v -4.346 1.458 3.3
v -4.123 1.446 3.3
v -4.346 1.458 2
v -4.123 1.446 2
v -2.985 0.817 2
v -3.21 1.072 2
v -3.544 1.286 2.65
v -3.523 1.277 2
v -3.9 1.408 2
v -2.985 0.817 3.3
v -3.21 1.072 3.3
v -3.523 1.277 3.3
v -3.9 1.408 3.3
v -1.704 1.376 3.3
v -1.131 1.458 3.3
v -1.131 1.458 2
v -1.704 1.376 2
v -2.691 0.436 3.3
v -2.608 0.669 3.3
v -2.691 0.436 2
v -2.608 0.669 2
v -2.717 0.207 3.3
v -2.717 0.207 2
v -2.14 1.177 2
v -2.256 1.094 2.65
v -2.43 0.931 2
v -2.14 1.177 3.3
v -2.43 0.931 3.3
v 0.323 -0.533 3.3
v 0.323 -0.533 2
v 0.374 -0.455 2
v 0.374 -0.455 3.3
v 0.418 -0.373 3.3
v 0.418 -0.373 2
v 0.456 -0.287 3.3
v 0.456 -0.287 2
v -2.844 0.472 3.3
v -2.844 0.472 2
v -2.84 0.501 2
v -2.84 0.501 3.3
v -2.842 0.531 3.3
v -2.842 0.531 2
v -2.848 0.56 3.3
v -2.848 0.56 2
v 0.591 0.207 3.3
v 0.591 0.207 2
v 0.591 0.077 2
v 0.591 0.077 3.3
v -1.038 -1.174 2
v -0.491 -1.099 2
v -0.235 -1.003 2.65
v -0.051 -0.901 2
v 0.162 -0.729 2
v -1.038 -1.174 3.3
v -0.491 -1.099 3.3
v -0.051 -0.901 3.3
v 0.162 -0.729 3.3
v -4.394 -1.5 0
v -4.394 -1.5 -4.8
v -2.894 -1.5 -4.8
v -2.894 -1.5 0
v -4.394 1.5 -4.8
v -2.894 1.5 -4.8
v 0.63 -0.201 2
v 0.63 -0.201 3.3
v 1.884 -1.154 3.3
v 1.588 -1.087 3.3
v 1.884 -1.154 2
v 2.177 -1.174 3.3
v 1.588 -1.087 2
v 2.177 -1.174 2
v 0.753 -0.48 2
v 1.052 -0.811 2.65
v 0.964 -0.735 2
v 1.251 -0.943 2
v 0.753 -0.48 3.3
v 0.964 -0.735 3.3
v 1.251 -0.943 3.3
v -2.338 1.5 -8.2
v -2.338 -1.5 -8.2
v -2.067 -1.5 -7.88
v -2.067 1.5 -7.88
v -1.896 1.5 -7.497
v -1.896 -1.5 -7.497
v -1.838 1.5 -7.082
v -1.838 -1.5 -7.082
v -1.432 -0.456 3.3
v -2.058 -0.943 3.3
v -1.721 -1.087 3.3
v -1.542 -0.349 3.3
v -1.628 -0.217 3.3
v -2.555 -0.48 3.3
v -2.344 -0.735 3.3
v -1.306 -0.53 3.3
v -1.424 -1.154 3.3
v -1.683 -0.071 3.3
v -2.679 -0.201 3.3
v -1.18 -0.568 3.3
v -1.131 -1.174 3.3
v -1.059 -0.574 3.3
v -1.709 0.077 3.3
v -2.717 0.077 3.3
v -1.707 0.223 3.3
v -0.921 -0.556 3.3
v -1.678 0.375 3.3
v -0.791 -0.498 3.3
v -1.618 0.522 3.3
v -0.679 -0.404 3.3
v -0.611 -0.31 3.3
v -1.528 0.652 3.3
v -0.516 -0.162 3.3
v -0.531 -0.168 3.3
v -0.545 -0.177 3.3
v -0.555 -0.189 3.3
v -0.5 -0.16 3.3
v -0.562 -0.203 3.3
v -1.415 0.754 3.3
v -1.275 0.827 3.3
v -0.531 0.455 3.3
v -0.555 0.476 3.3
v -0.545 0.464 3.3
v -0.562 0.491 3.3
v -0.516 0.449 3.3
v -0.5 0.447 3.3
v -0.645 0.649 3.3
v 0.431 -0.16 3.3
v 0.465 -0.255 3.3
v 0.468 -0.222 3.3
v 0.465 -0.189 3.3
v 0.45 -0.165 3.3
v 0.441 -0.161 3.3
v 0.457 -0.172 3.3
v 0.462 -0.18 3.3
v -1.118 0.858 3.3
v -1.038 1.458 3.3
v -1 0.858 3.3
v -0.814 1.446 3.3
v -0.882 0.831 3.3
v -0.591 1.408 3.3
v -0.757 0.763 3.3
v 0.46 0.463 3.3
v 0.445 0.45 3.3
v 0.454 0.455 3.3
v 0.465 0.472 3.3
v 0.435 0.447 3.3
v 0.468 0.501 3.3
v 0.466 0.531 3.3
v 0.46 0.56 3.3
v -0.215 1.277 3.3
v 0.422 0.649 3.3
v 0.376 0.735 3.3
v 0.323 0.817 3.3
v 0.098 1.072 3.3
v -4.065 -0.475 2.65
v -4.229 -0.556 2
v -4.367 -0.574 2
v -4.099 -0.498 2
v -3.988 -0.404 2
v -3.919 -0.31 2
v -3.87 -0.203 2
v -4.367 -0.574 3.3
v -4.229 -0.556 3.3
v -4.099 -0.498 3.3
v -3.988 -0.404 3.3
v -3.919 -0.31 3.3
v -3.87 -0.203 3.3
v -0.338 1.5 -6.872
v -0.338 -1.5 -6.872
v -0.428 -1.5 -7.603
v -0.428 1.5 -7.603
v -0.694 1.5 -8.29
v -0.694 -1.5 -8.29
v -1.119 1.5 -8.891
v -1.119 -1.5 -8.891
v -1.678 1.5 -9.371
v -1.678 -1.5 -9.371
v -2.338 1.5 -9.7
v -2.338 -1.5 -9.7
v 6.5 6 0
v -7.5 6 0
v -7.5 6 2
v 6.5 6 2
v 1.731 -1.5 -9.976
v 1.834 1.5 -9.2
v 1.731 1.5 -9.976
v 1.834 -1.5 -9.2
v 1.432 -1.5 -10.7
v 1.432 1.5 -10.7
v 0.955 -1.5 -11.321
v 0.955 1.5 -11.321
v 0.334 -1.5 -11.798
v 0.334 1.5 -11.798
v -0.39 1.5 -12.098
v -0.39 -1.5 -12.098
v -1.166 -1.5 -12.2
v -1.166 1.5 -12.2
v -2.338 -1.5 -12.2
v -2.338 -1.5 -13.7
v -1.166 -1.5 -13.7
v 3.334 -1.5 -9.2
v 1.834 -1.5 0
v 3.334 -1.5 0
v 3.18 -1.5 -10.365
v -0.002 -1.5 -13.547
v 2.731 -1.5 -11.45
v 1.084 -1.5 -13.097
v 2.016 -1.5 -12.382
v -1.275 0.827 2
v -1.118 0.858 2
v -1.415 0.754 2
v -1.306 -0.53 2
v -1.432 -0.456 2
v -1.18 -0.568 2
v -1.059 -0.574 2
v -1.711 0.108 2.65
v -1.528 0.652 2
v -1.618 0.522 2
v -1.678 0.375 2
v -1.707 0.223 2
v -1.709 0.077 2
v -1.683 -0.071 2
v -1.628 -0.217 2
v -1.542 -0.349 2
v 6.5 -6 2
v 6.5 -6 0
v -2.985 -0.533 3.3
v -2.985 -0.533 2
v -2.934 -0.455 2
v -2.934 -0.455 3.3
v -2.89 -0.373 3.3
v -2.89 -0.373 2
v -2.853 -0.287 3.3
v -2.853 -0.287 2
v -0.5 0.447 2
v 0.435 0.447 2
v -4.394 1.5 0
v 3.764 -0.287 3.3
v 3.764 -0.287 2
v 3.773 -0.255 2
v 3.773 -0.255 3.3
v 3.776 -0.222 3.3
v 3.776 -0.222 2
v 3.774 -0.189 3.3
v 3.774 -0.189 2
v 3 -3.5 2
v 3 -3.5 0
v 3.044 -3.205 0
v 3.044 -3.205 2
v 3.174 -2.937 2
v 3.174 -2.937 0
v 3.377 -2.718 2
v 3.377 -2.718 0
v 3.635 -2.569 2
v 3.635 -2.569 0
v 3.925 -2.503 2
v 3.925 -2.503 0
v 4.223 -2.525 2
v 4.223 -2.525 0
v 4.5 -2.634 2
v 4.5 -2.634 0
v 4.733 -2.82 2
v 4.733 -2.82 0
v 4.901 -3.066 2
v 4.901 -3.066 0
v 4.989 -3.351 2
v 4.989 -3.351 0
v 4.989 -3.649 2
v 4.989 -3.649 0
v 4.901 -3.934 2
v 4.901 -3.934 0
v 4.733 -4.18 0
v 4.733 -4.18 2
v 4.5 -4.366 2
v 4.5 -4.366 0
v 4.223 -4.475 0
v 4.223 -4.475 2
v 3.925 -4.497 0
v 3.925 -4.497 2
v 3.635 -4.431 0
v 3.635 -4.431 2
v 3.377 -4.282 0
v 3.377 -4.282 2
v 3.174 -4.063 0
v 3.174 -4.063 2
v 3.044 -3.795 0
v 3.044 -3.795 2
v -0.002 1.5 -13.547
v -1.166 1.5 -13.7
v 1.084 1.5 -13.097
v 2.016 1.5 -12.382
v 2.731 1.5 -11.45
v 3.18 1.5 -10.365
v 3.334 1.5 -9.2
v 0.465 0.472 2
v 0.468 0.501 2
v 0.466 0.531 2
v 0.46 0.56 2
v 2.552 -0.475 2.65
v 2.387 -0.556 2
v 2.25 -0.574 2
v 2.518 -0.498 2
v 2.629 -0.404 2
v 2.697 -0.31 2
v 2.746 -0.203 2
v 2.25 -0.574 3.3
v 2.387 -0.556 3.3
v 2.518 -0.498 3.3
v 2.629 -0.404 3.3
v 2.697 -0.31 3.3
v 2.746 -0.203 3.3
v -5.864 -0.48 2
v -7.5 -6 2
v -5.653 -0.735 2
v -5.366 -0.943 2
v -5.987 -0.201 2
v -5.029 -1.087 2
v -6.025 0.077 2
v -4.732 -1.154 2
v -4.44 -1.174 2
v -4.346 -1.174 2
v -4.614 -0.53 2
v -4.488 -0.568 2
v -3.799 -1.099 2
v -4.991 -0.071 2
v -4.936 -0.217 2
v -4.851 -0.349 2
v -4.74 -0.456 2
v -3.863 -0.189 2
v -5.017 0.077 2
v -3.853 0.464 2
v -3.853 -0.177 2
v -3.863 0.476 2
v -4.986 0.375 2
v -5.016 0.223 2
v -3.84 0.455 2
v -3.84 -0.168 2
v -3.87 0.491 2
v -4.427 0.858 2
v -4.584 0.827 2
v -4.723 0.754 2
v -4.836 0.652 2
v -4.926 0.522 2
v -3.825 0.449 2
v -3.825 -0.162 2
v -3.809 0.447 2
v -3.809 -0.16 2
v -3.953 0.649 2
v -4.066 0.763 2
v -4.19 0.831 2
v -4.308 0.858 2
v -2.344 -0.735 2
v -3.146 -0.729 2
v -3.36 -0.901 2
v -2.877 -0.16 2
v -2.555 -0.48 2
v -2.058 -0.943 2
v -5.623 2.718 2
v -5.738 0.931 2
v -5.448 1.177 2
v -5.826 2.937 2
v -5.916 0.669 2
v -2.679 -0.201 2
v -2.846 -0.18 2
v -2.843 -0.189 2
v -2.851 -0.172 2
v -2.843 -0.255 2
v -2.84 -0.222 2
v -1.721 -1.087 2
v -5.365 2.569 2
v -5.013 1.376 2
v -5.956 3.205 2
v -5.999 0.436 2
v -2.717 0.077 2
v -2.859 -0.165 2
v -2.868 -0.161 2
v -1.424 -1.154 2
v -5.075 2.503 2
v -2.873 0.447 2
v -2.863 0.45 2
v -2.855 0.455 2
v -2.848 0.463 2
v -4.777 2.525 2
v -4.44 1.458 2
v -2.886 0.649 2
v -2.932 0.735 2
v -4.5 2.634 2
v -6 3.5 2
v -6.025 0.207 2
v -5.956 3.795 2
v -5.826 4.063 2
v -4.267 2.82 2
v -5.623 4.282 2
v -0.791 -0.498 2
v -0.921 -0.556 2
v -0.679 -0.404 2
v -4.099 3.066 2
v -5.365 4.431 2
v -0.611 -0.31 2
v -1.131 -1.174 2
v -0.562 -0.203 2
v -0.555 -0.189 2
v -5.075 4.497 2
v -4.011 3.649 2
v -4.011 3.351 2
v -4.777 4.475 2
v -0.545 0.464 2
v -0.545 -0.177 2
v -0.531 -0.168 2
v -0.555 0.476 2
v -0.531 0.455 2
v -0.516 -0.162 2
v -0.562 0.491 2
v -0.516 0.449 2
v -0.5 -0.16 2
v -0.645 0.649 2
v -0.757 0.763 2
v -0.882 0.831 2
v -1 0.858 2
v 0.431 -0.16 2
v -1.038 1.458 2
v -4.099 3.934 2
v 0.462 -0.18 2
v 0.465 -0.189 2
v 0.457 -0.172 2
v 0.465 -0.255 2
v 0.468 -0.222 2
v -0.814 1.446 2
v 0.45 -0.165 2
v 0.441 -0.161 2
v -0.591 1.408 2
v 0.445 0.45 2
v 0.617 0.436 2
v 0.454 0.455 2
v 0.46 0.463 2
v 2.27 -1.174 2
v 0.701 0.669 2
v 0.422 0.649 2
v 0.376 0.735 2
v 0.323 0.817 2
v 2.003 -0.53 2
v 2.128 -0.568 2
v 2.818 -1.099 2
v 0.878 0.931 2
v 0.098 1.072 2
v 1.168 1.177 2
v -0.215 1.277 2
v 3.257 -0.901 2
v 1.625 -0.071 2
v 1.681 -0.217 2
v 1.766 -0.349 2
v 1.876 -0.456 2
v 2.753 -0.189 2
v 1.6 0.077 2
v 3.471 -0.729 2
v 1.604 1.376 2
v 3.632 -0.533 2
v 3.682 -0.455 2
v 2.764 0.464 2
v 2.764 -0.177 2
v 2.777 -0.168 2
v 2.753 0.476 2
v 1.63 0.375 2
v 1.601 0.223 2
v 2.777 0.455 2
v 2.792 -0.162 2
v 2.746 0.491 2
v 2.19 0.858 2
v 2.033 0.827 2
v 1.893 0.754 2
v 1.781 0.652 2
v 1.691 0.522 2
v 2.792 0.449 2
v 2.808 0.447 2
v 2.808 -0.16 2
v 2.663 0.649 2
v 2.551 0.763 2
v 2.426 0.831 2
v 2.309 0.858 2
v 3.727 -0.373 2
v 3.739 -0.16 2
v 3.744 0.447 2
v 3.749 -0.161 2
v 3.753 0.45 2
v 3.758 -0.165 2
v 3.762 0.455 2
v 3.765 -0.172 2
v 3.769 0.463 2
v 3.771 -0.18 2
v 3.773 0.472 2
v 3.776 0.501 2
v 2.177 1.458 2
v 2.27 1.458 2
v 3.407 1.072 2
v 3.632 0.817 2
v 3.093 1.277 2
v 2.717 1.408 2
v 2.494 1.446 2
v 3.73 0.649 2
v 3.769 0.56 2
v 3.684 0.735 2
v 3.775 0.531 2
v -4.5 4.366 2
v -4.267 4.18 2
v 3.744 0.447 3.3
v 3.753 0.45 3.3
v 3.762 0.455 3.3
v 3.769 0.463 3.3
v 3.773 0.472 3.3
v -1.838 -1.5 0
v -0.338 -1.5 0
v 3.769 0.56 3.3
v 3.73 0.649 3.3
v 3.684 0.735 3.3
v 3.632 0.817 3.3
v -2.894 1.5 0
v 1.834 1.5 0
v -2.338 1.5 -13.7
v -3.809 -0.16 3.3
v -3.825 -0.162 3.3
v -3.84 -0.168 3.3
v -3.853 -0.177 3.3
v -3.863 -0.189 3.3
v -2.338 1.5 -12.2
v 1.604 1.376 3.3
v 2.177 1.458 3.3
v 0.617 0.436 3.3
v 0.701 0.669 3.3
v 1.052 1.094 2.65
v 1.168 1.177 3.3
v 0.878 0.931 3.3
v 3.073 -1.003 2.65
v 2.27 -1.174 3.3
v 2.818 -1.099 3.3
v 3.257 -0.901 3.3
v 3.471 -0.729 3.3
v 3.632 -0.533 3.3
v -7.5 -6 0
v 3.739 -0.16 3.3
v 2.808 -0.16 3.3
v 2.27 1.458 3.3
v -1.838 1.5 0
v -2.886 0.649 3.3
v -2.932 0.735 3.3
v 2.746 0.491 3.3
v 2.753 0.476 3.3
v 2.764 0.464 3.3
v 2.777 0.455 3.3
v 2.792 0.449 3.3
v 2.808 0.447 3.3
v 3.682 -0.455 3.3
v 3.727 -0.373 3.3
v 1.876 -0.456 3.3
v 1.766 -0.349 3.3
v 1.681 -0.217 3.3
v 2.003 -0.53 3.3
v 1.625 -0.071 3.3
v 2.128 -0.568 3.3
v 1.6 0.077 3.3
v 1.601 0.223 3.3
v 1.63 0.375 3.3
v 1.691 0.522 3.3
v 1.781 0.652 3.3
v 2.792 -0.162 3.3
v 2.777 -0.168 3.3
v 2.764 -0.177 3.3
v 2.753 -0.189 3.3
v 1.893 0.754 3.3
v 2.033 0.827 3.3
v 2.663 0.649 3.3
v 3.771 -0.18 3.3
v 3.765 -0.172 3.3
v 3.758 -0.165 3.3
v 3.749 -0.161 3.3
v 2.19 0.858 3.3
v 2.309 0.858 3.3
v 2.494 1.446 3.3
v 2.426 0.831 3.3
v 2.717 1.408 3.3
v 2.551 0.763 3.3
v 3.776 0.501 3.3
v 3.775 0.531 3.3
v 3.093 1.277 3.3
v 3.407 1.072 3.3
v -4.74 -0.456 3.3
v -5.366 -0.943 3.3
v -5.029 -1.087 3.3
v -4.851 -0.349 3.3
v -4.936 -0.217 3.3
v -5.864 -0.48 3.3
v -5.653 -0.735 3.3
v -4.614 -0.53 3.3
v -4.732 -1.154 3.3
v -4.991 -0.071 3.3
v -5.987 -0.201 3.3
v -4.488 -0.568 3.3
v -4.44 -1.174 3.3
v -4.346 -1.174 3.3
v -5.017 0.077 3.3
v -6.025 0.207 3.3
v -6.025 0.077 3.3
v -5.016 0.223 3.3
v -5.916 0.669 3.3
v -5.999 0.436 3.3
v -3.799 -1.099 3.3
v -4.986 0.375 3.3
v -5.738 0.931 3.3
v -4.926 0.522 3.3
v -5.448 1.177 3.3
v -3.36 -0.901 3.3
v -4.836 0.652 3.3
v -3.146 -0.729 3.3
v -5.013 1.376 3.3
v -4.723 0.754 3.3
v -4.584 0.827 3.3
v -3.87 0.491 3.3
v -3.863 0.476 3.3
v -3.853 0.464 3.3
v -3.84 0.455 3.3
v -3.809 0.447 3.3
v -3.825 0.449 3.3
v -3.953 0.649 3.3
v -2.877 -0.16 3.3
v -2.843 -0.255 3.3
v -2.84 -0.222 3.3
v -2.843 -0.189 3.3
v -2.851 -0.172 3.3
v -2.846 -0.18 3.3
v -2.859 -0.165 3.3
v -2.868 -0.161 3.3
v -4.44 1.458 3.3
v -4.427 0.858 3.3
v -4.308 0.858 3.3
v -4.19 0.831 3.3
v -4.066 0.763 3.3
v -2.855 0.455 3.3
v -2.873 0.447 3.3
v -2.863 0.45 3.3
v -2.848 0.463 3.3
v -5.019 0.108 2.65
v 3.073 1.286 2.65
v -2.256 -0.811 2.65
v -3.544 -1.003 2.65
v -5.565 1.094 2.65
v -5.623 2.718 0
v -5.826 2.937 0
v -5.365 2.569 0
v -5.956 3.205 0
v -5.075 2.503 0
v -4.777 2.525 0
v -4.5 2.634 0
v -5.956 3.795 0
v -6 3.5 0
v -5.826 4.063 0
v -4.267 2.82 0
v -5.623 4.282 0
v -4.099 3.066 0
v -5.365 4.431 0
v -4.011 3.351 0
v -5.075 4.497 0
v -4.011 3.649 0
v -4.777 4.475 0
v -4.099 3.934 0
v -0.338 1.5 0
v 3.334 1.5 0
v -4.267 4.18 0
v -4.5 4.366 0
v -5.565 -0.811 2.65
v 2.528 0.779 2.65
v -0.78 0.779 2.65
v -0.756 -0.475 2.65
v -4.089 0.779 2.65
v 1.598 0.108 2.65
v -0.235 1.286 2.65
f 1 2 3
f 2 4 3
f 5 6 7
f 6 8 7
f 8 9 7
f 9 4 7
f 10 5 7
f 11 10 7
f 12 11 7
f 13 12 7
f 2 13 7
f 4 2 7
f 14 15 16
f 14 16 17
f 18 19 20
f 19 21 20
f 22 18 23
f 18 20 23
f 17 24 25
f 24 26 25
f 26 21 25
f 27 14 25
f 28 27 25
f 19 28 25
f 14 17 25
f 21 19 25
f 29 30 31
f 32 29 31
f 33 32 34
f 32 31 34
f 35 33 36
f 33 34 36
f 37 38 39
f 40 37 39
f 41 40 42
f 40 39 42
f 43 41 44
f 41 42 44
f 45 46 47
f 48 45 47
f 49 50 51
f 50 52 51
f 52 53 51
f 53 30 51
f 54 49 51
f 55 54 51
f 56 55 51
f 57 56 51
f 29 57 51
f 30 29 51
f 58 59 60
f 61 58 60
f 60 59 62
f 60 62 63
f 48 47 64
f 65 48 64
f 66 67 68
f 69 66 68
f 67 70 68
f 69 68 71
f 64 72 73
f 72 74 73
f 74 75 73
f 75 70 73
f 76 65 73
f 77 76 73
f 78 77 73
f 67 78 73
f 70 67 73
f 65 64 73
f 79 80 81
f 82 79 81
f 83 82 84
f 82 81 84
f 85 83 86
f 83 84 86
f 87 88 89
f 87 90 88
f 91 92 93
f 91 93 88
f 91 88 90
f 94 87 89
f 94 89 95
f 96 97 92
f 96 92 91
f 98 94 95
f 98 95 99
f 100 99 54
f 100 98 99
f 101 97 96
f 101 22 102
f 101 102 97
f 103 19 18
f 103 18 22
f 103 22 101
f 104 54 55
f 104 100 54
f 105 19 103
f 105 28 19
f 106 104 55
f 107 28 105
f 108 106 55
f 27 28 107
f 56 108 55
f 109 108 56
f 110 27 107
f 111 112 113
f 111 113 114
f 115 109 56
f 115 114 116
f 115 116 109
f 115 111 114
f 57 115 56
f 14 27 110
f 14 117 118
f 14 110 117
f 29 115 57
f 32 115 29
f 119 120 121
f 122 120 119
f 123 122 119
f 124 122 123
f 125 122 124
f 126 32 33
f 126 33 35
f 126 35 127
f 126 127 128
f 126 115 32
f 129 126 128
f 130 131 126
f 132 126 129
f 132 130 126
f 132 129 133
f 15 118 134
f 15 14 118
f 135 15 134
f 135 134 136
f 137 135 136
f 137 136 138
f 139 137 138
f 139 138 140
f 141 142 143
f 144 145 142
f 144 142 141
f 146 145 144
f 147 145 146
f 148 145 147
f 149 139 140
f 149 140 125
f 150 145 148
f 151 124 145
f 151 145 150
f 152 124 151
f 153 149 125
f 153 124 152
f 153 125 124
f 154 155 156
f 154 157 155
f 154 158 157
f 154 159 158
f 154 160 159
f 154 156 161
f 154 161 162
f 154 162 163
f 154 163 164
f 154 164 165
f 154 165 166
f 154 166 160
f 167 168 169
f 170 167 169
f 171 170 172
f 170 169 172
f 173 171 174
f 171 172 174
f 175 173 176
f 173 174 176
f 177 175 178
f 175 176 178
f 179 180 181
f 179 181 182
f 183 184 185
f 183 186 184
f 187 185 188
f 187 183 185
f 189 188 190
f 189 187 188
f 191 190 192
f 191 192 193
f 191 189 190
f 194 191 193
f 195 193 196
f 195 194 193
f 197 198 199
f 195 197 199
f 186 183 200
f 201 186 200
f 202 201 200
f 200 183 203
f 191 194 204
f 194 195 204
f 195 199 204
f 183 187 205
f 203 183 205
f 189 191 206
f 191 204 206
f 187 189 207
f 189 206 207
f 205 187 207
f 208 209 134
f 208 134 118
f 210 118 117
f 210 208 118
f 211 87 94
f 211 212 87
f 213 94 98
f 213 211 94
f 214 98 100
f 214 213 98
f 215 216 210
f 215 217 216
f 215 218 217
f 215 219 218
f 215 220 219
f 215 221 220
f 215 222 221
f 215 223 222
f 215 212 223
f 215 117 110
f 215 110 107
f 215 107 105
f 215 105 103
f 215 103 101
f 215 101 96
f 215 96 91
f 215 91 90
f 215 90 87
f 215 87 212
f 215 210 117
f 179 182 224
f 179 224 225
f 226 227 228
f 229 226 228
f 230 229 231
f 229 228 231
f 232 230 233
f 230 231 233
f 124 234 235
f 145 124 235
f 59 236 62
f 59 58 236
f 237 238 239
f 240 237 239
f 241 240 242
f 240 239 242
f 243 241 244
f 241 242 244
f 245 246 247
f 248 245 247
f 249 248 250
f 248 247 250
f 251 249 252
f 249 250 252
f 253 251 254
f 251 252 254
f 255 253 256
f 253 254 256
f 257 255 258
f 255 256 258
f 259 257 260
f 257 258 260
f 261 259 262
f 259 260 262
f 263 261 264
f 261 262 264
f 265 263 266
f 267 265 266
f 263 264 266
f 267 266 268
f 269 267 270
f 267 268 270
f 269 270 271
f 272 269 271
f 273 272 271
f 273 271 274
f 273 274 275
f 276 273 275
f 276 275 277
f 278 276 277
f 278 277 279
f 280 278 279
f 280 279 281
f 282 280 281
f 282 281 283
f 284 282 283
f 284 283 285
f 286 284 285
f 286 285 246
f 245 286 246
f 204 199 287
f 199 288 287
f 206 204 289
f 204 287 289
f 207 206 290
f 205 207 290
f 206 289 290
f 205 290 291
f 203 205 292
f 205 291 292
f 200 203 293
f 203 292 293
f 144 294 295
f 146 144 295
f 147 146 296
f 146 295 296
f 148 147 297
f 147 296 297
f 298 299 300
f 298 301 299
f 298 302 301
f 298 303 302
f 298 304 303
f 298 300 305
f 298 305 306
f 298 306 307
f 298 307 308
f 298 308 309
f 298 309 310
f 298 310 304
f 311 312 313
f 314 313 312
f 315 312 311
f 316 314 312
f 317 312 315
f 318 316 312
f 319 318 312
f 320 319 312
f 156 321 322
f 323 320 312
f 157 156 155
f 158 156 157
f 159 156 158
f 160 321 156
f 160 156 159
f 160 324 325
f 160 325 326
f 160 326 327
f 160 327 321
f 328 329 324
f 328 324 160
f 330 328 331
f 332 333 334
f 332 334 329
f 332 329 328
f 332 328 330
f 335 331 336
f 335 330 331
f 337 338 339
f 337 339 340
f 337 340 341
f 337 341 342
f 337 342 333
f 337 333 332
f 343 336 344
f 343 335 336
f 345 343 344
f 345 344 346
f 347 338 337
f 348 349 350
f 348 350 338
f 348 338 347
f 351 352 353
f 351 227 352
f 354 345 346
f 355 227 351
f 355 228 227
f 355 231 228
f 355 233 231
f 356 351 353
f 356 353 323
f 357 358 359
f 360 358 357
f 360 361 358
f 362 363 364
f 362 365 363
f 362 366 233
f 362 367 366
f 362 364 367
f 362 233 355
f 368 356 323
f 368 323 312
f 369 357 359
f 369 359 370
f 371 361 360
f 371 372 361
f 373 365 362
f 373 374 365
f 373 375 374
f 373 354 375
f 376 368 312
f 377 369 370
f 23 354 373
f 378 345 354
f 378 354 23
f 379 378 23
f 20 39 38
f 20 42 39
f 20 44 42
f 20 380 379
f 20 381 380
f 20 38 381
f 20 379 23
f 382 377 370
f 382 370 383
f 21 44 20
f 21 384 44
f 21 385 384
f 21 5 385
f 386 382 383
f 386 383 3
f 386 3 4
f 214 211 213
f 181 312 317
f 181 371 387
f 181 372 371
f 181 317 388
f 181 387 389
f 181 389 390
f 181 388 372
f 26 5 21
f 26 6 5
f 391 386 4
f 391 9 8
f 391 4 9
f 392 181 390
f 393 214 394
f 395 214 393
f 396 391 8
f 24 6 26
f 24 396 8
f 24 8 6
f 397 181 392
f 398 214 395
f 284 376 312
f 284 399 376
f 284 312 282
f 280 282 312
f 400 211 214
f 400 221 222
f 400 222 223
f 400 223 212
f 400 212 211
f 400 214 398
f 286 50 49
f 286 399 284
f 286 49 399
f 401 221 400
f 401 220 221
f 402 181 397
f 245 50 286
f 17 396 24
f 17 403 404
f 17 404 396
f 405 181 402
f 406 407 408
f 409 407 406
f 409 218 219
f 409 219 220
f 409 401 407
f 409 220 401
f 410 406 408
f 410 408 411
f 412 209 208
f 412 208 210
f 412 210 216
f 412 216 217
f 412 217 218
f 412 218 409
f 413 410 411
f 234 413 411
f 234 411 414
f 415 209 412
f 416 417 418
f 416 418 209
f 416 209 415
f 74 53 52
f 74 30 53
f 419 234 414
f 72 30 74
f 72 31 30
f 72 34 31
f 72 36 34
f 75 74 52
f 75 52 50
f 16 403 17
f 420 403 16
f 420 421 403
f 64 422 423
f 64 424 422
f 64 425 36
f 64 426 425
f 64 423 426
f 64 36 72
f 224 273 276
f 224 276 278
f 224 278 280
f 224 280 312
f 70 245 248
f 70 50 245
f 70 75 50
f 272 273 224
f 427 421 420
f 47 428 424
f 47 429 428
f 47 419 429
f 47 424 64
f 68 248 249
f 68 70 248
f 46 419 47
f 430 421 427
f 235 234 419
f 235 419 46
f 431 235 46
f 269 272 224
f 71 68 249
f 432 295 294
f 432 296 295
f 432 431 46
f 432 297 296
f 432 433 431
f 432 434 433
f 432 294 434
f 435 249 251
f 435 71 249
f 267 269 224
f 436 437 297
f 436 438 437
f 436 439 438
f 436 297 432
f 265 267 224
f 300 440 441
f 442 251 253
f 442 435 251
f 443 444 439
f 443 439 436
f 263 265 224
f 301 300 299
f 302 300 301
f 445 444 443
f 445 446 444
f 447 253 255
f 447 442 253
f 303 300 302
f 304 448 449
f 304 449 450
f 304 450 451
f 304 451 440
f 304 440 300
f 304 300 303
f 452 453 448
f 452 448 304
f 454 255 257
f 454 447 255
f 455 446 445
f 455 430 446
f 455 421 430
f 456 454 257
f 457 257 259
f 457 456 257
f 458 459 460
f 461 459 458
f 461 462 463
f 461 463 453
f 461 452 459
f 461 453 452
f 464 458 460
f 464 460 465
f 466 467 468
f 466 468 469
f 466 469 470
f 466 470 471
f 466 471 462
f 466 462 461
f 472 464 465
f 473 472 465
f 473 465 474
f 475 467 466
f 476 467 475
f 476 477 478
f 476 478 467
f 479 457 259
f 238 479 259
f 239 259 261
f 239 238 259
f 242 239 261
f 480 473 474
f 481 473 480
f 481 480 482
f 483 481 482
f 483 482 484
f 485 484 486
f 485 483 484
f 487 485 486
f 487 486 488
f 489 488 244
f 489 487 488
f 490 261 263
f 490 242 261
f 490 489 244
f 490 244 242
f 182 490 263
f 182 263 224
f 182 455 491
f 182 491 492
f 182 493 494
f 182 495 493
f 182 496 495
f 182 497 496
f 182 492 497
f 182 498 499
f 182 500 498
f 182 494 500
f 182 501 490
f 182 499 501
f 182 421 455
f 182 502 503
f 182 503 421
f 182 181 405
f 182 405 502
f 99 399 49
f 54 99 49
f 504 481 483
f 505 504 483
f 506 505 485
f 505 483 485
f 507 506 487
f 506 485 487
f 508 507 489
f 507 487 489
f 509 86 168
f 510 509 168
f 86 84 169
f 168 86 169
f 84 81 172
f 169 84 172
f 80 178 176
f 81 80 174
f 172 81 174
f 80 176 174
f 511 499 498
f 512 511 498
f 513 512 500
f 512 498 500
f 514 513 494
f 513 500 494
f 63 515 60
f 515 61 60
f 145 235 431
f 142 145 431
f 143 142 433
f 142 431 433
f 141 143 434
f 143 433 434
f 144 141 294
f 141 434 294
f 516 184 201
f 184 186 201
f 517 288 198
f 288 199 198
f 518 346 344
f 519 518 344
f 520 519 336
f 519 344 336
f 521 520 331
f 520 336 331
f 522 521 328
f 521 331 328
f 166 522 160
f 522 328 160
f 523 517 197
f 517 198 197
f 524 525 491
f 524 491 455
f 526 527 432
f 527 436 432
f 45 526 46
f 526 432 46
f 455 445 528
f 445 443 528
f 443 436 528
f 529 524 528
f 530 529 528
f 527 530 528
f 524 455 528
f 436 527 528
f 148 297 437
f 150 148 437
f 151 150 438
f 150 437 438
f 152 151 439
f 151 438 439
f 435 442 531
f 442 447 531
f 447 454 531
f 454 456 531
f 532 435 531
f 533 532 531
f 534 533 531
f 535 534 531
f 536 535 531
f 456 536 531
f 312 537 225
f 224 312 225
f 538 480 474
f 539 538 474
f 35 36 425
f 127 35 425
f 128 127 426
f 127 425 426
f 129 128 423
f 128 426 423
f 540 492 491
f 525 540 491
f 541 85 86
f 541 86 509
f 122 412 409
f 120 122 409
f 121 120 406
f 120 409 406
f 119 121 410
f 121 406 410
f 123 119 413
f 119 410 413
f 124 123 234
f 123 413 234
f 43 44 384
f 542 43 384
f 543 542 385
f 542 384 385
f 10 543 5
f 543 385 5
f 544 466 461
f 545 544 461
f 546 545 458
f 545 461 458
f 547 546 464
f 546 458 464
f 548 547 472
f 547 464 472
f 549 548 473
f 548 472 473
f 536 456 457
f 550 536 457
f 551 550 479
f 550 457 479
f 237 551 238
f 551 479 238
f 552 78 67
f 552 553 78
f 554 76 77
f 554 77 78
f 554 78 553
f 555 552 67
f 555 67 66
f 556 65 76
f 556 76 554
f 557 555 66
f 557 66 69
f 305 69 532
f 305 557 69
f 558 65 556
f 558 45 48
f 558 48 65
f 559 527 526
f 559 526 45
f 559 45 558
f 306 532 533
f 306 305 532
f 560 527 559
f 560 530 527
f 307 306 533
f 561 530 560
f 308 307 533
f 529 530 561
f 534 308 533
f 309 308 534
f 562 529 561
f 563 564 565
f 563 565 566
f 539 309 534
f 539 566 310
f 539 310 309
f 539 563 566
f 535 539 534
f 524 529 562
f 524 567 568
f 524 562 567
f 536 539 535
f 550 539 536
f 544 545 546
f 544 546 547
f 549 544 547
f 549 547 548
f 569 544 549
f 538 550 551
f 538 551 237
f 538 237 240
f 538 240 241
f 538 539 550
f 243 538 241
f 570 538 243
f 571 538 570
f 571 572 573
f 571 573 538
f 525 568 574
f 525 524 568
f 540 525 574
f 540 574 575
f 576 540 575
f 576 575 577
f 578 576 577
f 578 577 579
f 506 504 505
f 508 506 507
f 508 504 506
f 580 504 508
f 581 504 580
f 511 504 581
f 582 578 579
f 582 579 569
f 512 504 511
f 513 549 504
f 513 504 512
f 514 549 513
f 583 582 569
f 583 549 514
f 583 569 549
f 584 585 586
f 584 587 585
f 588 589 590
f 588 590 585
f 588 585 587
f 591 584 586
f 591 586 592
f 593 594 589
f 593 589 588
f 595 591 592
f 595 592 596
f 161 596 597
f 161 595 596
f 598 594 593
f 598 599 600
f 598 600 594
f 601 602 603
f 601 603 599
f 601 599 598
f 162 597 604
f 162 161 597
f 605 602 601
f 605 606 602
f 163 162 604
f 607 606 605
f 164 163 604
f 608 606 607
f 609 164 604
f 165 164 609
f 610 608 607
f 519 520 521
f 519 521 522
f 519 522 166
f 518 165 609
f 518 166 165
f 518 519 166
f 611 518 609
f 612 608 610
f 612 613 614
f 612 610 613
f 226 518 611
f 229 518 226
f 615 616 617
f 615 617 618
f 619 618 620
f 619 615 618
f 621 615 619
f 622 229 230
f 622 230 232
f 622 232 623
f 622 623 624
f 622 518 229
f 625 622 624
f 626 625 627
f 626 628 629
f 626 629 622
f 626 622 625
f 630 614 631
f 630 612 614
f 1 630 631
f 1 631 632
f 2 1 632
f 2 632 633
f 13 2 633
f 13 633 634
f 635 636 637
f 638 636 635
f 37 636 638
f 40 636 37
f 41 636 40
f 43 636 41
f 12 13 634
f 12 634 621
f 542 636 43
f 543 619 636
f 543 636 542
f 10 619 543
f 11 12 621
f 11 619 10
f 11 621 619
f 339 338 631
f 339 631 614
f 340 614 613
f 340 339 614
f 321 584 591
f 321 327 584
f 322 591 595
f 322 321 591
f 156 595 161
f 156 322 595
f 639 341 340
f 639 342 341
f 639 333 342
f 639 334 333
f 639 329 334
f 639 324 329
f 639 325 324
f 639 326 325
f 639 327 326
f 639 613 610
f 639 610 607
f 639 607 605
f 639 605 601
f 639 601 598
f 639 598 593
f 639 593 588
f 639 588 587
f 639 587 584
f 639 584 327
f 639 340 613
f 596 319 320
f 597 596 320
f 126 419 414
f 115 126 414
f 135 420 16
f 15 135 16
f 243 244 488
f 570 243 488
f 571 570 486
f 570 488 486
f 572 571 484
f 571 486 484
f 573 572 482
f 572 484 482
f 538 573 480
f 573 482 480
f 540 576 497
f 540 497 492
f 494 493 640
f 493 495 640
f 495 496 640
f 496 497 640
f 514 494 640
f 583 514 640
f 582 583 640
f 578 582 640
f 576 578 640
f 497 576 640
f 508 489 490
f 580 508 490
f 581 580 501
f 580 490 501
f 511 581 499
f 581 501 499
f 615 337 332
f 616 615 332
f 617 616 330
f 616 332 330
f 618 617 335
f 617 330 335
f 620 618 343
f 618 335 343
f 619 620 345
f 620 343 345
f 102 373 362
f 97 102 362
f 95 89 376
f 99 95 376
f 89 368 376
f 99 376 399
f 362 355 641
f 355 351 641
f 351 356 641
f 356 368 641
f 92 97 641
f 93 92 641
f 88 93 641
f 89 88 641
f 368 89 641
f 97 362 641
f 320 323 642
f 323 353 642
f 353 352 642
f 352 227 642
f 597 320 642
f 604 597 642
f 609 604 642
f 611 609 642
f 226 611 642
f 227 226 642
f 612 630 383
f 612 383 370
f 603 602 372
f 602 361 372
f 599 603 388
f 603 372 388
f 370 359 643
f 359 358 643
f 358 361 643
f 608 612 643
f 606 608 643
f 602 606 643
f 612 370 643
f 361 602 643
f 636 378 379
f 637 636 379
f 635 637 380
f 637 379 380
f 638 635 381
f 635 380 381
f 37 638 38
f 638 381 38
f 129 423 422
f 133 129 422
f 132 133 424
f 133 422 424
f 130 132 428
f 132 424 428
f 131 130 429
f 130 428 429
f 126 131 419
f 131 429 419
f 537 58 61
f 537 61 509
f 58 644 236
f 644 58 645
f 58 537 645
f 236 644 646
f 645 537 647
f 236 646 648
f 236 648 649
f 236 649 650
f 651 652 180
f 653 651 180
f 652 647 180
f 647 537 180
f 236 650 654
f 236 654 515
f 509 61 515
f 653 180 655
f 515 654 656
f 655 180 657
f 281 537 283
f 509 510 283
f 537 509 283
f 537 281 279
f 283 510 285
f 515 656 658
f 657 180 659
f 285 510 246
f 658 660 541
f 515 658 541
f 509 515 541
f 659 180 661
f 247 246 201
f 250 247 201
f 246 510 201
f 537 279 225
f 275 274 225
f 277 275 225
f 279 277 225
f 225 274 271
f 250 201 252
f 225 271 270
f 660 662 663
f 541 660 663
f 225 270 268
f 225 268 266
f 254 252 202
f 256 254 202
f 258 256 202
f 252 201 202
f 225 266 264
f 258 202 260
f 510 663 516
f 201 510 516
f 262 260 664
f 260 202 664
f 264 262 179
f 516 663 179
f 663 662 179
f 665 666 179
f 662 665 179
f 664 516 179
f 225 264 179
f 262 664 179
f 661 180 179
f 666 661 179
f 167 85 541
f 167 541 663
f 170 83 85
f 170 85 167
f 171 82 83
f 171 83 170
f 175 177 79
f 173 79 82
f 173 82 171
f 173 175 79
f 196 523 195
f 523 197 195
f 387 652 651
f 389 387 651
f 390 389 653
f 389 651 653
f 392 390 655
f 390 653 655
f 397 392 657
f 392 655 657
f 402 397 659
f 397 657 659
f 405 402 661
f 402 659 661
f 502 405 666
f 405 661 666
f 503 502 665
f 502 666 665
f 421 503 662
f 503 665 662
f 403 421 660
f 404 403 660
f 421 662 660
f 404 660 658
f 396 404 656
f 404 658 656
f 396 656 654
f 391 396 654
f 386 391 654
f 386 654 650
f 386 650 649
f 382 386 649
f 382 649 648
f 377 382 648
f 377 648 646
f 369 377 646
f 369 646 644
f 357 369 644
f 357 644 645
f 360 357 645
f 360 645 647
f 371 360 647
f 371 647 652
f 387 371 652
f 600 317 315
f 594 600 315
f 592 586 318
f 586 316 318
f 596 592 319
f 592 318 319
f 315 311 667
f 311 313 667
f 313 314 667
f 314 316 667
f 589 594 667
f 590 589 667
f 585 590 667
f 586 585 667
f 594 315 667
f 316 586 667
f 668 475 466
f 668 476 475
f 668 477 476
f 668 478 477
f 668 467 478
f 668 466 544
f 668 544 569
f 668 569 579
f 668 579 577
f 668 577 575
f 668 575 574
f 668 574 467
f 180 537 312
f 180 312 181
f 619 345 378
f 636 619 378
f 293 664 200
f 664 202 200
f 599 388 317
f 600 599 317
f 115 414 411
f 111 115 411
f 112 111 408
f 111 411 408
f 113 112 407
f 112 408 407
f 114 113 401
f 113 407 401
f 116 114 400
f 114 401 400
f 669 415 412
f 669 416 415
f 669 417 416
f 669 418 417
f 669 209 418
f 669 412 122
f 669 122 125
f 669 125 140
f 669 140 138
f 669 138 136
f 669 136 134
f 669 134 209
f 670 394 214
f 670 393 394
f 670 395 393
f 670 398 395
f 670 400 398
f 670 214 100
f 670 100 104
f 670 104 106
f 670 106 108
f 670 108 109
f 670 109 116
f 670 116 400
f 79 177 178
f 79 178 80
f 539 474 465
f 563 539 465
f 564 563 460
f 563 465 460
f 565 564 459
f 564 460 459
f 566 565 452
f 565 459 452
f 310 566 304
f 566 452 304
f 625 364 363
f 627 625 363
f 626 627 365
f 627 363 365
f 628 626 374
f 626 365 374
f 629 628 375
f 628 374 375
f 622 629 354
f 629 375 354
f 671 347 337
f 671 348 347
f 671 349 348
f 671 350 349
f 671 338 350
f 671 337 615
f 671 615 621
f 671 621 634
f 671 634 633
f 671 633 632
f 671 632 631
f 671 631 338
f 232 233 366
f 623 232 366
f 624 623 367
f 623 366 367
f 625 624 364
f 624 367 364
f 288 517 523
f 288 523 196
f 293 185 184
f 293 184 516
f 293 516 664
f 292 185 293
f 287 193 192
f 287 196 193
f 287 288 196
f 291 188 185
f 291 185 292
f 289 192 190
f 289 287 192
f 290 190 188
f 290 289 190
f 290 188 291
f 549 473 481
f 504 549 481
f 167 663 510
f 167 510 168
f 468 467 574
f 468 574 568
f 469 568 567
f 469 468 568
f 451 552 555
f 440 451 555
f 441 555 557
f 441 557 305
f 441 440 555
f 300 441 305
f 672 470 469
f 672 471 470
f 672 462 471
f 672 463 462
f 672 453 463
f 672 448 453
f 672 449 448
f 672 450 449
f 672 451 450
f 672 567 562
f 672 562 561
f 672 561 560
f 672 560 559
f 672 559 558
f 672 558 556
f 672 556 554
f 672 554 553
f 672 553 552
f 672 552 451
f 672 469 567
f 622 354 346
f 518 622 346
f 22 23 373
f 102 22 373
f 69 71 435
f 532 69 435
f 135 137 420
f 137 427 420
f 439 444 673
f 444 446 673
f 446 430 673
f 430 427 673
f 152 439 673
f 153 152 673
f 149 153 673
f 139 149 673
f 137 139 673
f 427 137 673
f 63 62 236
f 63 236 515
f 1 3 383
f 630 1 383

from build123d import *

# Parameters (mm, degrees)
SKETCH1_W           = 15
SKETCH1_H           = 12
BOSS_EXTRUDE1_DEPTH = 2
BOSS_EXTRUDE2_DEPTH = 2
SKETCH3_W           = 1.5
SKETCH3_H           = 4.8
BOSS_EXTRUDE3_DEPTH = 1.5
FILLET3_START       = -1.5
FILLET3_DEPTH       = 3
FILLET4_R           = 3
FILLET5_R           = 3
FILLET6_R           = 4.5
SKETCH4_W           = 2
SKETCH4_H           = 12
CUT_EXTRUDE1_DEPTH  = 1
SKETCH5_R           = 1
CUT_EXTRUDE2_DEPTH  = 17.731407672
CUT_EXTRUDE3_START  = -0.7
CUT_EXTRUDE3_DEPTH  = 0.7


with BuildPart() as part:
    # Sketch1 → Boss-Extrude1 (new body)
    with BuildSketch(Plane.XY):
        Rectangle(SKETCH1_W, SKETCH1_H)
    extrude(amount=BOSS_EXTRUDE1_DEPTH)

    # Sketch2 → Boss-Extrude2 (add)
    with BuildSketch(Plane.XY.offset(2)):
        with BuildLine():
            Line((-0.500488048, 0.447210694), (0.435347045, 0.447210694))
            ThreePointArc((0.435347045, 0.447210694), (0.453657173, 0.45529852), (0.464590943, 0.472065344))
            ThreePointArc((0.464590943, 0.472065344), (0.467777397, 0.516057125), (0.460402384, 0.559543208))
            ThreePointArc((0.460402384, 0.559543208), (0.399954535, 0.692528449), (0.323240273, 0.816842321))
            add(Edge.make_bspline(
                [(0.323240273, 0.816842321), (-0.095057279, 1.457976678), (-1.037858727, 1.457976694)],
                knots=[0.342748392, 0.342748392, 0.342748392, 1.381331674, 1.381331674, 1.381331674], degree=2, weights=[1, 0.868170932, 1]))
            Line((-1.037858727, 1.457976694), (-1.131479815, 1.457976694))
            add(Edge.make_bspline(
                [(-1.131479815, 1.457976694), (-2.717136663, 1.457976694), (-2.717136676, 0.206821629)],
                knots=[4.81203319, 4.81203319, 4.81203319, 6.344970318, 6.344970318, 6.344970318], degree=2, weights=[1, 0.720364545, 1]))
            Line((-2.717136676, 0.206821629), (-2.717136676, 0.076691364))
            add(Edge.make_bspline(
                [(-2.717136676, 0.076691364), (-2.717136676, -1.174463735), (-1.131479784, -1.174463712)],
                knots=[3.079807634, 3.079807634, 3.079807634, 4.61274479, 4.61274479, 4.61274479], degree=2, weights=[1, 0.720364535, 1]))
            Line((-1.131479784, -1.174463712), (-1.037858761, -1.174463712))
            add(Edge.make_bspline(
                [(-1.037858761, -1.174463712), (-0.095057289, -1.174463712), (0.323240273, -0.533329339)],
                knots=[1.760260959, 1.760260959, 1.760260959, 2.798844261, 2.798844261, 2.798844261], degree=2, weights=[1, 0.868170926, 1]))
            ThreePointArc((0.323240273, -0.533329339), (0.396990367, -0.414226505), (0.455654338, -0.287013692))
            ThreePointArc((0.455654338, -0.287013692), (0.467247325, -0.238690378), (0.465485217, -0.189027163))
            ThreePointArc((0.465485217, -0.189027163), (0.453480667, -0.168104183), (0.430820669, -0.159833461))
            Line((0.430820669, -0.159833461), (-0.50048808, -0.159833461))
            ThreePointArc((-0.50048808, -0.159833461), (-0.53825591, -0.17183426), (-0.562169449, -0.203434431))
            add(Edge.make_bspline(
                [(-1.058661028, -0.574317984), (-0.693553117, -0.574677188), (-0.562169449, -0.203434431)],
                knots=[5.955155363, 5.955155363, 5.955155363, 7.020735544, 7.020735544, 7.020735544], degree=2, weights=[1, 0.86139323, 1]))
            add(Edge.make_bspline(
                [(-1.118454184, 0.858318186), (-1.740543918, 0.826860552), (-1.710558048, 0.108403064), (-1.680572179, -0.610054424), (-1.058661028, -0.574317984)],
                knots=[3.181025595, 3.181025595, 3.181025595, 4.754799698, 4.754799698, 6.328573801, 6.328573801, 6.328573801], degree=2, weights=[1, 0.706053195, 1, 0.706053195, 1]))
            add(Edge.make_bspline(
                [(-0.562169449, 0.490811684), (-0.70840827, 0.904029734), (-1.118454184, 0.858318186)],
                knots=[2.404042417, 2.404042417, 2.404042417, 3.565685694, 3.565685694, 3.565685694], degree=2, weights=[1, 0.83601209, 1]))
            ThreePointArc((-0.562169449, 0.490811684), (-0.538255894, 0.459211502), (-0.500488048, 0.447210694))
        make_face()
        with BuildLine():
            Line((-3.808792647, 0.447210694), (-2.872957501, 0.447210694))
            ThreePointArc((-2.872957501, 0.447210694), (-2.854647373, 0.45529852), (-2.843713602, 0.472065344))
            ThreePointArc((-2.843713602, 0.472065344), (-2.840527149, 0.516057125), (-2.847902161, 0.559543208))
            ThreePointArc((-2.847902161, 0.559543208), (-2.90835001, 0.692528449), (-2.985064272, 0.816842321))
            add(Edge.make_bspline(
                [(-2.985064272, 0.816842321), (-3.403361825, 1.457976679), (-4.346163273, 1.457976694)],
                knots=[0.342748392, 0.342748392, 0.342748392, 1.381331674, 1.381331674, 1.381331674], degree=2, weights=[1, 0.868170932, 1]))
            Line((-4.346163273, 1.457976694), (-4.43978436, 1.457976694))
            add(Edge.make_bspline(
                [(-4.43978436, 1.457976694), (-6.025441208, 1.457976694), (-6.025441222, 0.206821629)],
                knots=[4.81203319, 4.81203319, 4.81203319, 6.344970318, 6.344970318, 6.344970318], degree=2, weights=[1, 0.720364545, 1]))
            Line((-6.025441222, 0.206821629), (-6.025441222, 0.076691364))
            add(Edge.make_bspline(
                [(-6.025441222, 0.076691364), (-6.025441222, -1.174463735), (-4.439784331, -1.174463712)],
                knots=[6.221400287, 6.221400287, 6.221400287, 7.754337442, 7.754337442, 7.754337442], degree=2, weights=[1, 0.720364536, 1]))
            Line((-4.439784331, -1.174463712), (-4.346163307, -1.174463712))
            add(Edge.make_bspline(
                [(-4.346163307, -1.174463712), (-3.403361835, -1.174463712), (-2.985064272, -0.533329339)],
                knots=[1.760260959, 1.760260959, 1.760260959, 2.798844261, 2.798844261, 2.798844261], degree=2, weights=[1, 0.868170926, 1]))
            ThreePointArc((-2.985064272, -0.533329339), (-2.911314179, -0.414226505), (-2.852650208, -0.287013692))
            ThreePointArc((-2.852650208, -0.287013692), (-2.84105722, -0.238690378), (-2.842819329, -0.189027163))
            ThreePointArc((-2.842819329, -0.189027163), (-2.854823879, -0.168104182), (-2.877483878, -0.159833461))
            Line((-2.877483878, -0.159833461), (-3.808792626, -0.159833461))
            ThreePointArc((-3.808792626, -0.159833461), (-3.846560455, -0.17183426), (-3.870473995, -0.203434431))
            add(Edge.make_bspline(
                [(-4.366965573, -0.574317984), (-4.001857663, -0.574677188), (-3.870473995, -0.203434431)],
                knots=[2.81356271, 2.81356271, 2.81356271, 3.87914289, 3.87914289, 3.87914289], degree=2, weights=[1, 0.86139323, 1]))
            add(Edge.make_bspline(
                [(-4.42675873, 0.858318186), (-5.048848463, 0.826860552), (-5.018862594, 0.108403064), (-4.988876725, -0.610054424), (-4.366965573, -0.574317984)],
                knots=[3.181025595, 3.181025595, 3.181025595, 4.754799698, 4.754799698, 6.328573801, 6.328573801, 6.328573801], degree=2, weights=[1, 0.706053195, 1, 0.706053195, 1]))
            add(Edge.make_bspline(
                [(-3.870473995, 0.490811684), (-4.016712815, 0.904029734), (-4.42675873, 0.858318186)],
                knots=[5.54563507, 5.54563507, 5.54563507, 6.707278348, 6.707278348, 6.707278348], degree=2, weights=[1, 0.83601209, 1]))
            ThreePointArc((-3.870473995, 0.490811684), (-3.846560461, 0.459211518), (-3.808792647, 0.447210694))
        make_face()
        with BuildLine():
            Line((2.807816498, 0.447210694), (3.743651591, 0.447210694))
            ThreePointArc((3.743651591, 0.447210694), (3.761961719, 0.45529852), (3.772895489, 0.472065344))
            ThreePointArc((3.772895489, 0.472065344), (3.776081943, 0.516057125), (3.76870693, 0.559543208))
            ThreePointArc((3.76870693, 0.559543208), (3.708259081, 0.692528449), (3.631544819, 0.816842321))
            add(Edge.make_bspline(
                [(3.631544819, 0.816842321), (3.213247267, 1.457976678), (2.270445819, 1.457976694)],
                knots=[0.342748392, 0.342748392, 0.342748392, 1.381331674, 1.381331674, 1.381331674], degree=2, weights=[1, 0.868170932, 1]))
            Line((2.270445819, 1.457976694), (2.176824731, 1.457976694))
            add(Edge.make_bspline(
                [(2.176824731, 1.457976694), (0.591167883, 1.457976694), (0.59116787, 0.206821629)],
                knots=[4.81203319, 4.81203319, 4.81203319, 6.344970318, 6.344970318, 6.344970318], degree=2, weights=[1, 0.720364545, 1]))
            Line((0.59116787, 0.206821629), (0.59116787, 0.076691364))
            add(Edge.make_bspline(
                [(0.59116787, 0.076691364), (0.59116787, -1.174463735), (2.176824762, -1.174463712)],
                knots=[3.079807634, 3.079807634, 3.079807634, 4.61274479, 4.61274479, 4.61274479], degree=2, weights=[1, 0.720364535, 1]))
            Line((2.176824762, -1.174463712), (2.270445785, -1.174463712))
            add(Edge.make_bspline(
                [(2.270445785, -1.174463712), (3.213247257, -1.174463712), (3.631544819, -0.533329339)],
                knots=[1.760260959, 1.760260959, 1.760260959, 2.798844261, 2.798844261, 2.798844261], degree=2, weights=[1, 0.868170926, 1]))
            ThreePointArc((3.631544819, -0.533329339), (3.705294913, -0.414226505), (3.763958884, -0.287013692))
            ThreePointArc((3.763958884, -0.287013692), (3.775551871, -0.238690378), (3.773789763, -0.189027163))
            ThreePointArc((3.773789763, -0.189027163), (3.761785213, -0.168104183), (3.739125215, -0.159833461))
            Line((3.739125215, -0.159833461), (2.807816466, -0.159833461))
            ThreePointArc((2.807816466, -0.159833461), (2.770048636, -0.17183426), (2.746135097, -0.203434431))
            add(Edge.make_bspline(
                [(2.249643518, -0.574317984), (2.614751429, -0.574677188), (2.746135097, -0.203434431)],
                knots=[2.81356271, 2.81356271, 2.81356271, 3.87914289, 3.87914289, 3.87914289], degree=2, weights=[1, 0.86139323, 1]))
            add(Edge.make_bspline(
                [(2.189850362, 0.858318186), (1.567760628, 0.826860552), (1.597746498, 0.108403064), (1.627732367, -0.610054424), (2.249643518, -0.574317984)],
                knots=[0.039432941, 0.039432941, 0.039432941, 1.613207044, 1.613207044, 3.186981147, 3.186981147, 3.186981147], degree=2, weights=[1, 0.706053195, 1, 0.706053195, 1]))
            add(Edge.make_bspline(
                [(2.746135097, 0.490811684), (2.599896276, 0.904029734), (2.189850362, 0.858318186)],
                knots=[2.404042417, 2.404042417, 2.404042417, 3.565685694, 3.565685694, 3.565685694], degree=2, weights=[1, 0.83601209, 1]))
            ThreePointArc((2.746135097, 0.490811684), (2.770048652, 0.459211502), (2.807816498, 0.447210694))
        make_face()
    extrude(amount=BOSS_EXTRUDE2_DEPTH)

    # Sketch3 → Boss-Extrude3 (add, symmetric)
    with BuildSketch(Plane(origin=(0, 0, 0), x_dir=(1, 0, 0), z_dir=(0, 1, 0))):
        Polygon((1.833716, 0), (3.333716, 0), (3.333716, 13.7), (-2.337662633, 13.7), (-2.337662633, 12.2), (1.833716, 12.2), align=None)
        with Locations((-3.644025381, 2.4)):
            Rectangle(SKETCH3_W, SKETCH3_H)
        Polygon((-1.837662633, 0), (-0.337662633, 0), (-0.337662633, 9.7), (-2.337662633, 9.7), (-2.337662633, 8.2), (-1.837662633, 8.2), align=None)
    extrude(amount=BOSS_EXTRUDE3_DEPTH, both=True)

    # Fillet3: read off the stored shape, not the designer's step
    # Fillet3 outline → Fillet3 (add)
    with BuildSketch(Plane(origin=(0, 0, 0), x_dir=(1, 0, 0), z_dir=(0, 1, 0)).offset(FILLET3_START)):
        with BuildLine():
            Line((-1.837662633, 8.2), (-2.337662633, 8.2))
            ThreePointArc((-2.337662633, 8.2), (-1.968356239, 7.694338447), (-1.837662633, 7.081966011))
            Line((-1.837662633, 7.081966011), (-1.837662633, 8.2))
        make_face()
    extrude(amount=FILLET3_DEPTH)

    # Fillet4
    # the kernel refuses this fillet: 3 mm, written as the material it takes off along each edge
    with BuildSketch(Plane(origin=(-0.337662633, -8.571067812, -9.7), x_dir=(0, 0, 1), z_dir=(0, 1, 0))) as fillet4_piece_1:
        with BuildLine():
            CenterArc((2.828427125, -3), FILLET4_R, 90, 70.528779366)
            Line((0, -2), (-0.056568542, -1.98))
            ThreePointArc((-0.056568542, -1.98), (-0.06, -1), (-0.06, 0))
            Line((-0.06, 0), (0, 0.06))
            Line((0, 0.06), (2.828427125, 0.06))
            Line((2.828427125, 0.06), (2.828427125, 0))
        make_face()
    extrude(amount=17.142135624, mode=Mode.SUBTRACT)

    # Fillet5
    fillet5_edges = [part.edges().sort_by_distance(p)[0] for p in [
        (1.833716, 0, -12.2),
    ]]
    fillet(fillet5_edges, radius=FILLET5_R)

    # Fillet6
    fillet6_edges = [part.edges().sort_by_distance(p)[0] for p in [
        (3.333716, 0, -13.7),
    ]]
    fillet(fillet6_edges, radius=FILLET6_R)

    # Sketch4 → Cut-Extrude1 (cut)
    with BuildSketch(Plane(origin=(7.5, 0, 0), x_dir=(0, 0, -1), z_dir=(1, 0, 0))):
        with Locations((-1, 0)):
            Rectangle(SKETCH4_W, SKETCH4_H)
    extrude(amount=-CUT_EXTRUDE1_DEPTH, mode=Mode.SUBTRACT)

    # Sketch5 → Cut-Extrude2 (cut, through all)
    with BuildSketch(Plane(origin=(0, 0, 0), x_dir=(-1, 0, 0), z_dir=(0, 0, -1))):
        with Locations((-4, -3.5)):
            Circle(SKETCH5_R)
        with Locations((5, 3.5)):
            Circle(SKETCH5_R)
    extrude(amount=-CUT_EXTRUDE2_DEPTH, mode=Mode.SUBTRACT)

    # Sketch6 → Cut-Extrude3 (cut)
    with BuildSketch(Plane.XY.offset(4).offset(CUT_EXTRUDE3_START)):
        with BuildLine():
            Line((-3.808792647, 0.447210694), (-2.872957501, 0.447210694))
            ThreePointArc((-2.872957501, 0.447210694), (-2.854647373, 0.45529852), (-2.843713602, 0.472065344))
            ThreePointArc((-2.843713602, 0.472065344), (-2.840527149, 0.516057125), (-2.847902161, 0.559543208))
            ThreePointArc((-2.847902161, 0.559543208), (-2.90835001, 0.692528449), (-2.985064272, 0.816842321))
            add(Edge.make_bspline(
                [(-2.985064272, 0.816842321), (-3.403361825, 1.457976679), (-4.346163273, 1.457976694)],
                knots=[0.342748392, 0.342748392, 0.342748392, 1.381331674, 1.381331674, 1.381331674], degree=2, weights=[1, 0.868170932, 1]))
            Line((-4.346163273, 1.457976694), (-4.43978436, 1.457976694))
            add(Edge.make_bspline(
                [(-4.43978436, 1.457976694), (-6.025441208, 1.457976694), (-6.025441222, 0.206821629)],
                knots=[4.81203319, 4.81203319, 4.81203319, 6.344970318, 6.344970318, 6.344970318], degree=2, weights=[1, 0.720364545, 1]))
            Line((-6.025441222, 0.206821629), (-6.025441222, 0.076691364))
            add(Edge.make_bspline(
                [(-6.025441222, 0.076691364), (-6.025441222, -1.174463735), (-4.439784331, -1.174463712)],
                knots=[6.221400287, 6.221400287, 6.221400287, 7.754337442, 7.754337442, 7.754337442], degree=2, weights=[1, 0.720364536, 1]))
            Line((-4.439784331, -1.174463712), (-4.346163307, -1.174463712))
            add(Edge.make_bspline(
                [(-4.346163307, -1.174463712), (-3.403361835, -1.174463712), (-2.985064272, -0.533329339)],
                knots=[1.760260959, 1.760260959, 1.760260959, 2.798844261, 2.798844261, 2.798844261], degree=2, weights=[1, 0.868170926, 1]))
            ThreePointArc((-2.985064272, -0.533329339), (-2.911314179, -0.414226505), (-2.852650208, -0.287013692))
            ThreePointArc((-2.852650208, -0.287013692), (-2.84105722, -0.238690378), (-2.842819329, -0.189027163))
            ThreePointArc((-2.842819329, -0.189027163), (-2.854823879, -0.168104182), (-2.877483878, -0.159833461))
            Line((-2.877483878, -0.159833461), (-3.808792626, -0.159833461))
            ThreePointArc((-3.808792626, -0.159833461), (-3.846560455, -0.17183426), (-3.870473995, -0.203434431))
            add(Edge.make_bspline(
                [(-4.366965573, -0.574317984), (-4.001857663, -0.574677188), (-3.870473995, -0.203434431)],
                knots=[5.955155363, 5.955155363, 5.955155363, 7.020735544, 7.020735544, 7.020735544], degree=2, weights=[1, 0.86139323, 1]))
            add(Edge.make_bspline(
                [(-4.42675873, 0.858318186), (-5.048848463, 0.826860552), (-5.018862594, 0.108403064), (-4.988876725, -0.610054424), (-4.366965573, -0.574317984)],
                knots=[3.181025595, 3.181025595, 3.181025595, 4.754799698, 4.754799698, 6.328573801, 6.328573801, 6.328573801], degree=2, weights=[1, 0.706053195, 1, 0.706053195, 1]))
            add(Edge.make_bspline(
                [(-3.870473995, 0.490811684), (-4.016712815, 0.904029734), (-4.42675873, 0.858318186)],
                knots=[2.404042417, 2.404042417, 2.404042417, 3.565685694, 3.565685694, 3.565685694], degree=2, weights=[1, 0.83601209, 1]))
            ThreePointArc((-3.870473995, 0.490811684), (-3.846560461, 0.459211518), (-3.808792647, 0.447210694))
        make_face()
        with BuildLine():
            Line((-0.500488048, 0.447210694), (0.435347045, 0.447210694))
            ThreePointArc((0.435347045, 0.447210694), (0.453657173, 0.45529852), (0.464590943, 0.472065344))
            ThreePointArc((0.464590943, 0.472065344), (0.467777397, 0.516057125), (0.460402384, 0.559543208))
            ThreePointArc((0.460402384, 0.559543208), (0.399954535, 0.692528449), (0.323240273, 0.816842321))
            add(Edge.make_bspline(
                [(0.323240273, 0.816842321), (-0.095057279, 1.457976678), (-1.037858727, 1.457976694)],
                knots=[0.342748392, 0.342748392, 0.342748392, 1.381331674, 1.381331674, 1.381331674], degree=2, weights=[1, 0.868170932, 1]))
            Line((-1.037858727, 1.457976694), (-1.131479815, 1.457976694))
            add(Edge.make_bspline(
                [(-1.131479815, 1.457976694), (-2.717136663, 1.457976694), (-2.717136676, 0.206821629)],
                knots=[4.81203319, 4.81203319, 4.81203319, 6.344970318, 6.344970318, 6.344970318], degree=2, weights=[1, 0.720364545, 1]))
            Line((-2.717136676, 0.206821629), (-2.717136676, 0.076691364))
            add(Edge.make_bspline(
                [(-2.717136676, 0.076691364), (-2.717136676, -1.174463735), (-1.131479784, -1.174463712)],
                knots=[3.079807634, 3.079807634, 3.079807634, 4.61274479, 4.61274479, 4.61274479], degree=2, weights=[1, 0.720364535, 1]))
            Line((-1.131479784, -1.174463712), (-1.037858761, -1.174463712))
            add(Edge.make_bspline(
                [(-1.037858761, -1.174463712), (-0.095057289, -1.174463712), (0.323240273, -0.533329339)],
                knots=[1.760260959, 1.760260959, 1.760260959, 2.798844261, 2.798844261, 2.798844261], degree=2, weights=[1, 0.868170926, 1]))
            ThreePointArc((0.323240273, -0.533329339), (0.396990367, -0.414226505), (0.455654338, -0.287013692))
            ThreePointArc((0.455654338, -0.287013692), (0.467247325, -0.238690378), (0.465485217, -0.189027163))
            ThreePointArc((0.465485217, -0.189027163), (0.453480667, -0.168104183), (0.430820669, -0.159833461))
            Line((0.430820669, -0.159833461), (-0.50048808, -0.159833461))
            ThreePointArc((-0.50048808, -0.159833461), (-0.53825591, -0.17183426), (-0.562169449, -0.203434431))
            add(Edge.make_bspline(
                [(-1.058661028, -0.574317984), (-0.693553117, -0.574677188), (-0.562169449, -0.203434431)],
                knots=[5.955155363, 5.955155363, 5.955155363, 7.020735544, 7.020735544, 7.020735544], degree=2, weights=[1, 0.86139323, 1]))
            add(Edge.make_bspline(
                [(-1.118454184, 0.858318186), (-1.740543918, 0.826860552), (-1.710558048, 0.108403064), (-1.680572179, -0.610054424), (-1.058661028, -0.574317984)],
                knots=[3.181025595, 3.181025595, 3.181025595, 4.754799698, 4.754799698, 6.328573801, 6.328573801, 6.328573801], degree=2, weights=[1, 0.706053195, 1, 0.706053195, 1]))
            add(Edge.make_bspline(
                [(-0.562169449, 0.490811684), (-0.70840827, 0.904029734), (-1.118454184, 0.858318186)],
                knots=[2.404042417, 2.404042417, 2.404042417, 3.565685694, 3.565685694, 3.565685694], degree=2, weights=[1, 0.83601209, 1]))
            ThreePointArc((-0.562169449, 0.490811684), (-0.538255894, 0.459211502), (-0.500488048, 0.447210694))
        make_face()
        with BuildLine():
            Line((2.807816498, 0.447210694), (3.743651591, 0.447210694))
            ThreePointArc((3.743651591, 0.447210694), (3.761961719, 0.45529852), (3.772895489, 0.472065344))
            ThreePointArc((3.772895489, 0.472065344), (3.776081943, 0.516057125), (3.76870693, 0.559543208))
            ThreePointArc((3.76870693, 0.559543208), (3.708259081, 0.692528449), (3.631544819, 0.816842321))
            add(Edge.make_bspline(
                [(3.631544819, 0.816842321), (3.213247267, 1.457976678), (2.270445819, 1.457976694)],
                knots=[0.342748392, 0.342748392, 0.342748392, 1.381331674, 1.381331674, 1.381331674], degree=2, weights=[1, 0.868170932, 1]))
            Line((2.270445819, 1.457976694), (2.176824731, 1.457976694))
            add(Edge.make_bspline(
                [(2.176824731, 1.457976694), (0.591167883, 1.457976694), (0.59116787, 0.206821629)],
                knots=[4.81203319, 4.81203319, 4.81203319, 6.344970318, 6.344970318, 6.344970318], degree=2, weights=[1, 0.720364545, 1]))
            Line((0.59116787, 0.206821629), (0.59116787, 0.076691364))
            add(Edge.make_bspline(
                [(0.59116787, 0.076691364), (0.59116787, -1.174463735), (2.176824762, -1.174463712)],
                knots=[3.079807634, 3.079807634, 3.079807634, 4.61274479, 4.61274479, 4.61274479], degree=2, weights=[1, 0.720364535, 1]))
            Line((2.176824762, -1.174463712), (2.270445785, -1.174463712))
            add(Edge.make_bspline(
                [(2.270445785, -1.174463712), (3.213247257, -1.174463712), (3.631544819, -0.533329339)],
                knots=[1.760260959, 1.760260959, 1.760260959, 2.798844261, 2.798844261, 2.798844261], degree=2, weights=[1, 0.868170926, 1]))
            ThreePointArc((3.631544819, -0.533329339), (3.705294913, -0.414226505), (3.763958884, -0.287013692))
            ThreePointArc((3.763958884, -0.287013692), (3.775551871, -0.238690378), (3.773789763, -0.189027163))
            ThreePointArc((3.773789763, -0.189027163), (3.761785213, -0.168104183), (3.739125215, -0.159833461))
            Line((3.739125215, -0.159833461), (2.807816466, -0.159833461))
            ThreePointArc((2.807816466, -0.159833461), (2.770048636, -0.17183426), (2.746135097, -0.203434431))
            add(Edge.make_bspline(
                [(2.249643518, -0.574317984), (2.614751429, -0.574677188), (2.746135097, -0.203434431)],
                knots=[5.955155363, 5.955155363, 5.955155363, 7.020735544, 7.020735544, 7.020735544], degree=2, weights=[1, 0.86139323, 1]))
            add(Edge.make_bspline(
                [(2.189850362, 0.858318186), (1.567760628, 0.826860552), (1.597746498, 0.108403064), (1.627732367, -0.610054424), (2.249643518, -0.574317984)],
                knots=[3.181025595, 3.181025595, 3.181025595, 4.754799698, 4.754799698, 6.328573801, 6.328573801, 6.328573801], degree=2, weights=[1, 0.706053195, 1, 0.706053195, 1]))
            add(Edge.make_bspline(
                [(2.746135097, 0.490811684), (2.599896276, 0.904029734), (2.189850362, 0.858318186)],
                knots=[2.404042417, 2.404042417, 2.404042417, 3.565685694, 3.565685694, 3.565685694], degree=2, weights=[1, 0.83601209, 1]))
            ThreePointArc((2.746135097, 0.490811684), (2.770048652, 0.459211502), (2.807816498, 0.447210694))
        make_face()
    extrude(amount=CUT_EXTRUDE3_DEPTH, mode=Mode.SUBTRACT)


solid = part.part
